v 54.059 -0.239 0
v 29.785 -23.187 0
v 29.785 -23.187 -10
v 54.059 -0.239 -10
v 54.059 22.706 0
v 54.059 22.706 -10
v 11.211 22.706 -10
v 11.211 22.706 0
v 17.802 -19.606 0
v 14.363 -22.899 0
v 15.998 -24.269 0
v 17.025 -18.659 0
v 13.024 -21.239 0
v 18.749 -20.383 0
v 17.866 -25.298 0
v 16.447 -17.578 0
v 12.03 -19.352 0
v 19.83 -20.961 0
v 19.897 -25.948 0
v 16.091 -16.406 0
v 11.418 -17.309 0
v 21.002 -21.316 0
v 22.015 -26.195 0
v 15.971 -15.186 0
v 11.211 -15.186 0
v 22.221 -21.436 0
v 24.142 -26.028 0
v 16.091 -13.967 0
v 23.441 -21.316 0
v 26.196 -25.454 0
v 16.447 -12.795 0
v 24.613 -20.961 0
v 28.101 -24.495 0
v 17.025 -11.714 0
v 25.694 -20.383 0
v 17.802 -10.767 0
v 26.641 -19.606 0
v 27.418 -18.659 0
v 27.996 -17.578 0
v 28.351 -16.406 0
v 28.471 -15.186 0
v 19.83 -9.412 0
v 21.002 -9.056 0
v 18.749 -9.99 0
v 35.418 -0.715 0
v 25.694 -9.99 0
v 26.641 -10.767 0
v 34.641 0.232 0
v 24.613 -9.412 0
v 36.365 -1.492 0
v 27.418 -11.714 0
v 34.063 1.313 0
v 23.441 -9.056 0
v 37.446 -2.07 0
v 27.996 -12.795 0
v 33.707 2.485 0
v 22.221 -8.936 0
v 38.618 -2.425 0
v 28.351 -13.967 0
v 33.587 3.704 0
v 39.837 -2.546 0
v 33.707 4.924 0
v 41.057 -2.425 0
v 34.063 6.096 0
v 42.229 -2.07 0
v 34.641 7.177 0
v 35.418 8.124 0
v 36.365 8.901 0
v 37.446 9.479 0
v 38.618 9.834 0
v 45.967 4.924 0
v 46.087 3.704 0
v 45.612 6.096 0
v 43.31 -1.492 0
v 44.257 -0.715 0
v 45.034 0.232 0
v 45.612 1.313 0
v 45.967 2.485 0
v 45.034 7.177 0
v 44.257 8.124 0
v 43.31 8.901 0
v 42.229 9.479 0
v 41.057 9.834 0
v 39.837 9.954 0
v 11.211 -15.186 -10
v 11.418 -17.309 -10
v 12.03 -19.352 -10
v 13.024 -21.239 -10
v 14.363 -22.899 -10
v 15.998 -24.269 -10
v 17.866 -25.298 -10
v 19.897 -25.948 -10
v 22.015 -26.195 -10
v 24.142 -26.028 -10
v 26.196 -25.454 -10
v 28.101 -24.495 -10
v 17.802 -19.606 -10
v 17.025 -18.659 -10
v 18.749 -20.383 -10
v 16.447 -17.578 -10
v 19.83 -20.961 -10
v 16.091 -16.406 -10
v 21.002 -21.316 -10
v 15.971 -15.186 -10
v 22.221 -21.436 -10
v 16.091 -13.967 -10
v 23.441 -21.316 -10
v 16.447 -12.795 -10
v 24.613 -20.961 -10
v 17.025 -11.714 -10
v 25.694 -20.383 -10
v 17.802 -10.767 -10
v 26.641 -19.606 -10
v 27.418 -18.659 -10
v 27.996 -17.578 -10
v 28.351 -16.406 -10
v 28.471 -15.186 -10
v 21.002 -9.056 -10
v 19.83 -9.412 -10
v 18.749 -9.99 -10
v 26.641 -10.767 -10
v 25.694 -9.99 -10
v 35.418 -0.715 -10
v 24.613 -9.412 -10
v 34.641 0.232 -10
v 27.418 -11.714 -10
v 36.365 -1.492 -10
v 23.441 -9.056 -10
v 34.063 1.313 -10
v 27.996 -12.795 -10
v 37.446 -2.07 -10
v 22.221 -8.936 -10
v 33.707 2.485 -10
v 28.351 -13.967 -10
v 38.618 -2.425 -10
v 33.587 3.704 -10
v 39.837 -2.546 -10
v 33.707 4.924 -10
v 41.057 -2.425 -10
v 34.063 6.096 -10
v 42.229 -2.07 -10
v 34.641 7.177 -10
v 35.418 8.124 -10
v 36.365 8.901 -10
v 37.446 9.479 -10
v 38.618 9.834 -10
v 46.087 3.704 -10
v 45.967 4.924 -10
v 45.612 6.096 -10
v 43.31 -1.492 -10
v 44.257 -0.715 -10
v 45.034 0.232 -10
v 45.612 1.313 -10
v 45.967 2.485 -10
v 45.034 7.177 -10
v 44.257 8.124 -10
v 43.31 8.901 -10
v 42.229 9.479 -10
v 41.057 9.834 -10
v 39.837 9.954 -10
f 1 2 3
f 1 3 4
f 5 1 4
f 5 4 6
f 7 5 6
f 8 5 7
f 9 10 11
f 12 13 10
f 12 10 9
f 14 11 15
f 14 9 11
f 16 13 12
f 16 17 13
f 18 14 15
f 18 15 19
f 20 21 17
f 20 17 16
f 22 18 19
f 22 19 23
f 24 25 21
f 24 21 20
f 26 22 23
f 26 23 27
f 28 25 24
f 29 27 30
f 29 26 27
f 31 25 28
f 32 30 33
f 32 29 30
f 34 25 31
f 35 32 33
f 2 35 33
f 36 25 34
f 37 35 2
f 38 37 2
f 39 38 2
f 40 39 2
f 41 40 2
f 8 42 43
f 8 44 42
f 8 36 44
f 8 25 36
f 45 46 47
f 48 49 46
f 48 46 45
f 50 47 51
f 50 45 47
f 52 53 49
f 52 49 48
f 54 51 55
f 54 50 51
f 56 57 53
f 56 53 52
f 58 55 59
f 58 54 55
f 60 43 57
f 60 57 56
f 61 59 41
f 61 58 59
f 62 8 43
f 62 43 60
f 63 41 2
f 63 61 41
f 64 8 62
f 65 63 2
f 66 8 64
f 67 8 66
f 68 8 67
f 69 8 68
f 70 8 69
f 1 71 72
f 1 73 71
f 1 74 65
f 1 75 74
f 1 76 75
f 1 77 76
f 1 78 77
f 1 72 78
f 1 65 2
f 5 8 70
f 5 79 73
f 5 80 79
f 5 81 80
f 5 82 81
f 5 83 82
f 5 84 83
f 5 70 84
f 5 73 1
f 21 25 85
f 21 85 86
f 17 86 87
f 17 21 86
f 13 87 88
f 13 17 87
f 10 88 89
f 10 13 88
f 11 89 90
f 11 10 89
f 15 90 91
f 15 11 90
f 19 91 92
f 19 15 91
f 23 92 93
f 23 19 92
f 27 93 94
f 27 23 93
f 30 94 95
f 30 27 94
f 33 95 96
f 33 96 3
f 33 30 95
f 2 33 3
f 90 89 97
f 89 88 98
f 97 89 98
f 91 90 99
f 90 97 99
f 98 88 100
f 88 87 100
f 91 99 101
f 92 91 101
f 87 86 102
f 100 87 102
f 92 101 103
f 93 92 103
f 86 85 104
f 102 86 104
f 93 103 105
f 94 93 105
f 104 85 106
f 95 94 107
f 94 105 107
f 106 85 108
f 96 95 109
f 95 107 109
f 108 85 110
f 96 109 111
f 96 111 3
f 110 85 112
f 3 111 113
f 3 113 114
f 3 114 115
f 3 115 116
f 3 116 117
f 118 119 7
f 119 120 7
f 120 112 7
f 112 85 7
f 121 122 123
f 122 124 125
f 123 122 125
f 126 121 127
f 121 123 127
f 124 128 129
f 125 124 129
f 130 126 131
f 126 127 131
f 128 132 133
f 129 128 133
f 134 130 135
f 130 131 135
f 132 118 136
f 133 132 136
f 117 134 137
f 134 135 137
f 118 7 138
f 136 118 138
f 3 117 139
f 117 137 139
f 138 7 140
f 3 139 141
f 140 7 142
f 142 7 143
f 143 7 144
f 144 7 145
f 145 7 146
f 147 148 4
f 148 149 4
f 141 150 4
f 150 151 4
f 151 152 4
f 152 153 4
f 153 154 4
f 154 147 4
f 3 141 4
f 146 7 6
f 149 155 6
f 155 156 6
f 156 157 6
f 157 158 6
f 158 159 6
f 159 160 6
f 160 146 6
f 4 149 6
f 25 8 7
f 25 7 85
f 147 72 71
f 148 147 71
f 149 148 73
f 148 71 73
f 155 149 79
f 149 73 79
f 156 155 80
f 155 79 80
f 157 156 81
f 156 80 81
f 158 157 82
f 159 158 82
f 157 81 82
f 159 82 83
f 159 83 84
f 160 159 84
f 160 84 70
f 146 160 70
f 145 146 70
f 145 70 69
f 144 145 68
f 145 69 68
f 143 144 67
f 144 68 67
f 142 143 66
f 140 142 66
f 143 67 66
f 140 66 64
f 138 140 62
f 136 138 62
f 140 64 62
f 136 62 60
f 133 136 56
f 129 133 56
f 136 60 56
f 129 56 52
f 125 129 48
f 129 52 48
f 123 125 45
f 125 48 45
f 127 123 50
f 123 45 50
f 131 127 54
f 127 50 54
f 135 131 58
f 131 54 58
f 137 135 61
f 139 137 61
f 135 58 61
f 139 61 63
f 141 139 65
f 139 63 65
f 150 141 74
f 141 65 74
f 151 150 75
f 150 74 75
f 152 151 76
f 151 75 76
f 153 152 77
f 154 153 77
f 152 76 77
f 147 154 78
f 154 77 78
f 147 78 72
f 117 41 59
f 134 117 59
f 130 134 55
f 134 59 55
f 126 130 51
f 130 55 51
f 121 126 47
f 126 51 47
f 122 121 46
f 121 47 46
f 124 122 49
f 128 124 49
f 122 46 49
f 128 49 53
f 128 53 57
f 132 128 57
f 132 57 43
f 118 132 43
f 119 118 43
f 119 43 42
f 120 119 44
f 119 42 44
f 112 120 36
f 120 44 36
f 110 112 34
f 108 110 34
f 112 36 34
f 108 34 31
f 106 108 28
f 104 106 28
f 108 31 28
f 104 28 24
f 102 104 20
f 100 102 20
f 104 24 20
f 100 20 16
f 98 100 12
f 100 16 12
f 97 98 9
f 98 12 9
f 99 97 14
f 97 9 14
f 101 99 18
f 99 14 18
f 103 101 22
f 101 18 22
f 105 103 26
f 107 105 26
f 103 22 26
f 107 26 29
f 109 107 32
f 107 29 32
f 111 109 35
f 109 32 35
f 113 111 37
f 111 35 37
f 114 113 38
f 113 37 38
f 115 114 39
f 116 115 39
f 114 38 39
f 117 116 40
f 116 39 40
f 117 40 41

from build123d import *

# Parameters (mm, degrees)
SKETCH1_R          = 6.25
BASE_EXTRUDE_DEPTH = 10


with BuildPart() as part:
    # Sketch1 → Base-Extrude (new body)
    with BuildSketch(Plane.XY):
        with BuildLine():
            Line((29.785193593, -23.187206185), (54.059480558, -0.238916618))
            Line((54.059480558, -0.238916618), (54.059480558, 22.705666265))
            Line((54.059480558, 22.705666265), (11.211177394, 22.705666265))
            Line((11.211177394, 22.705666265), (11.211177394, -15.186351603))
            ThreePointArc((11.211177394, -15.186351603), (17.865606506, -25.298321636), (29.785193593, -23.187206185))
        make_face()
        with Locations((22.221390463, -15.186351603)):
            Circle(SKETCH1_R, mode=Mode.SUBTRACT)
        with Locations((39.837339904, 3.704441374)):
            Circle(SKETCH1_R, mode=Mode.SUBTRACT)
    extrude(amount=-BASE_EXTRUDE_DEPTH)


solid = part.part
